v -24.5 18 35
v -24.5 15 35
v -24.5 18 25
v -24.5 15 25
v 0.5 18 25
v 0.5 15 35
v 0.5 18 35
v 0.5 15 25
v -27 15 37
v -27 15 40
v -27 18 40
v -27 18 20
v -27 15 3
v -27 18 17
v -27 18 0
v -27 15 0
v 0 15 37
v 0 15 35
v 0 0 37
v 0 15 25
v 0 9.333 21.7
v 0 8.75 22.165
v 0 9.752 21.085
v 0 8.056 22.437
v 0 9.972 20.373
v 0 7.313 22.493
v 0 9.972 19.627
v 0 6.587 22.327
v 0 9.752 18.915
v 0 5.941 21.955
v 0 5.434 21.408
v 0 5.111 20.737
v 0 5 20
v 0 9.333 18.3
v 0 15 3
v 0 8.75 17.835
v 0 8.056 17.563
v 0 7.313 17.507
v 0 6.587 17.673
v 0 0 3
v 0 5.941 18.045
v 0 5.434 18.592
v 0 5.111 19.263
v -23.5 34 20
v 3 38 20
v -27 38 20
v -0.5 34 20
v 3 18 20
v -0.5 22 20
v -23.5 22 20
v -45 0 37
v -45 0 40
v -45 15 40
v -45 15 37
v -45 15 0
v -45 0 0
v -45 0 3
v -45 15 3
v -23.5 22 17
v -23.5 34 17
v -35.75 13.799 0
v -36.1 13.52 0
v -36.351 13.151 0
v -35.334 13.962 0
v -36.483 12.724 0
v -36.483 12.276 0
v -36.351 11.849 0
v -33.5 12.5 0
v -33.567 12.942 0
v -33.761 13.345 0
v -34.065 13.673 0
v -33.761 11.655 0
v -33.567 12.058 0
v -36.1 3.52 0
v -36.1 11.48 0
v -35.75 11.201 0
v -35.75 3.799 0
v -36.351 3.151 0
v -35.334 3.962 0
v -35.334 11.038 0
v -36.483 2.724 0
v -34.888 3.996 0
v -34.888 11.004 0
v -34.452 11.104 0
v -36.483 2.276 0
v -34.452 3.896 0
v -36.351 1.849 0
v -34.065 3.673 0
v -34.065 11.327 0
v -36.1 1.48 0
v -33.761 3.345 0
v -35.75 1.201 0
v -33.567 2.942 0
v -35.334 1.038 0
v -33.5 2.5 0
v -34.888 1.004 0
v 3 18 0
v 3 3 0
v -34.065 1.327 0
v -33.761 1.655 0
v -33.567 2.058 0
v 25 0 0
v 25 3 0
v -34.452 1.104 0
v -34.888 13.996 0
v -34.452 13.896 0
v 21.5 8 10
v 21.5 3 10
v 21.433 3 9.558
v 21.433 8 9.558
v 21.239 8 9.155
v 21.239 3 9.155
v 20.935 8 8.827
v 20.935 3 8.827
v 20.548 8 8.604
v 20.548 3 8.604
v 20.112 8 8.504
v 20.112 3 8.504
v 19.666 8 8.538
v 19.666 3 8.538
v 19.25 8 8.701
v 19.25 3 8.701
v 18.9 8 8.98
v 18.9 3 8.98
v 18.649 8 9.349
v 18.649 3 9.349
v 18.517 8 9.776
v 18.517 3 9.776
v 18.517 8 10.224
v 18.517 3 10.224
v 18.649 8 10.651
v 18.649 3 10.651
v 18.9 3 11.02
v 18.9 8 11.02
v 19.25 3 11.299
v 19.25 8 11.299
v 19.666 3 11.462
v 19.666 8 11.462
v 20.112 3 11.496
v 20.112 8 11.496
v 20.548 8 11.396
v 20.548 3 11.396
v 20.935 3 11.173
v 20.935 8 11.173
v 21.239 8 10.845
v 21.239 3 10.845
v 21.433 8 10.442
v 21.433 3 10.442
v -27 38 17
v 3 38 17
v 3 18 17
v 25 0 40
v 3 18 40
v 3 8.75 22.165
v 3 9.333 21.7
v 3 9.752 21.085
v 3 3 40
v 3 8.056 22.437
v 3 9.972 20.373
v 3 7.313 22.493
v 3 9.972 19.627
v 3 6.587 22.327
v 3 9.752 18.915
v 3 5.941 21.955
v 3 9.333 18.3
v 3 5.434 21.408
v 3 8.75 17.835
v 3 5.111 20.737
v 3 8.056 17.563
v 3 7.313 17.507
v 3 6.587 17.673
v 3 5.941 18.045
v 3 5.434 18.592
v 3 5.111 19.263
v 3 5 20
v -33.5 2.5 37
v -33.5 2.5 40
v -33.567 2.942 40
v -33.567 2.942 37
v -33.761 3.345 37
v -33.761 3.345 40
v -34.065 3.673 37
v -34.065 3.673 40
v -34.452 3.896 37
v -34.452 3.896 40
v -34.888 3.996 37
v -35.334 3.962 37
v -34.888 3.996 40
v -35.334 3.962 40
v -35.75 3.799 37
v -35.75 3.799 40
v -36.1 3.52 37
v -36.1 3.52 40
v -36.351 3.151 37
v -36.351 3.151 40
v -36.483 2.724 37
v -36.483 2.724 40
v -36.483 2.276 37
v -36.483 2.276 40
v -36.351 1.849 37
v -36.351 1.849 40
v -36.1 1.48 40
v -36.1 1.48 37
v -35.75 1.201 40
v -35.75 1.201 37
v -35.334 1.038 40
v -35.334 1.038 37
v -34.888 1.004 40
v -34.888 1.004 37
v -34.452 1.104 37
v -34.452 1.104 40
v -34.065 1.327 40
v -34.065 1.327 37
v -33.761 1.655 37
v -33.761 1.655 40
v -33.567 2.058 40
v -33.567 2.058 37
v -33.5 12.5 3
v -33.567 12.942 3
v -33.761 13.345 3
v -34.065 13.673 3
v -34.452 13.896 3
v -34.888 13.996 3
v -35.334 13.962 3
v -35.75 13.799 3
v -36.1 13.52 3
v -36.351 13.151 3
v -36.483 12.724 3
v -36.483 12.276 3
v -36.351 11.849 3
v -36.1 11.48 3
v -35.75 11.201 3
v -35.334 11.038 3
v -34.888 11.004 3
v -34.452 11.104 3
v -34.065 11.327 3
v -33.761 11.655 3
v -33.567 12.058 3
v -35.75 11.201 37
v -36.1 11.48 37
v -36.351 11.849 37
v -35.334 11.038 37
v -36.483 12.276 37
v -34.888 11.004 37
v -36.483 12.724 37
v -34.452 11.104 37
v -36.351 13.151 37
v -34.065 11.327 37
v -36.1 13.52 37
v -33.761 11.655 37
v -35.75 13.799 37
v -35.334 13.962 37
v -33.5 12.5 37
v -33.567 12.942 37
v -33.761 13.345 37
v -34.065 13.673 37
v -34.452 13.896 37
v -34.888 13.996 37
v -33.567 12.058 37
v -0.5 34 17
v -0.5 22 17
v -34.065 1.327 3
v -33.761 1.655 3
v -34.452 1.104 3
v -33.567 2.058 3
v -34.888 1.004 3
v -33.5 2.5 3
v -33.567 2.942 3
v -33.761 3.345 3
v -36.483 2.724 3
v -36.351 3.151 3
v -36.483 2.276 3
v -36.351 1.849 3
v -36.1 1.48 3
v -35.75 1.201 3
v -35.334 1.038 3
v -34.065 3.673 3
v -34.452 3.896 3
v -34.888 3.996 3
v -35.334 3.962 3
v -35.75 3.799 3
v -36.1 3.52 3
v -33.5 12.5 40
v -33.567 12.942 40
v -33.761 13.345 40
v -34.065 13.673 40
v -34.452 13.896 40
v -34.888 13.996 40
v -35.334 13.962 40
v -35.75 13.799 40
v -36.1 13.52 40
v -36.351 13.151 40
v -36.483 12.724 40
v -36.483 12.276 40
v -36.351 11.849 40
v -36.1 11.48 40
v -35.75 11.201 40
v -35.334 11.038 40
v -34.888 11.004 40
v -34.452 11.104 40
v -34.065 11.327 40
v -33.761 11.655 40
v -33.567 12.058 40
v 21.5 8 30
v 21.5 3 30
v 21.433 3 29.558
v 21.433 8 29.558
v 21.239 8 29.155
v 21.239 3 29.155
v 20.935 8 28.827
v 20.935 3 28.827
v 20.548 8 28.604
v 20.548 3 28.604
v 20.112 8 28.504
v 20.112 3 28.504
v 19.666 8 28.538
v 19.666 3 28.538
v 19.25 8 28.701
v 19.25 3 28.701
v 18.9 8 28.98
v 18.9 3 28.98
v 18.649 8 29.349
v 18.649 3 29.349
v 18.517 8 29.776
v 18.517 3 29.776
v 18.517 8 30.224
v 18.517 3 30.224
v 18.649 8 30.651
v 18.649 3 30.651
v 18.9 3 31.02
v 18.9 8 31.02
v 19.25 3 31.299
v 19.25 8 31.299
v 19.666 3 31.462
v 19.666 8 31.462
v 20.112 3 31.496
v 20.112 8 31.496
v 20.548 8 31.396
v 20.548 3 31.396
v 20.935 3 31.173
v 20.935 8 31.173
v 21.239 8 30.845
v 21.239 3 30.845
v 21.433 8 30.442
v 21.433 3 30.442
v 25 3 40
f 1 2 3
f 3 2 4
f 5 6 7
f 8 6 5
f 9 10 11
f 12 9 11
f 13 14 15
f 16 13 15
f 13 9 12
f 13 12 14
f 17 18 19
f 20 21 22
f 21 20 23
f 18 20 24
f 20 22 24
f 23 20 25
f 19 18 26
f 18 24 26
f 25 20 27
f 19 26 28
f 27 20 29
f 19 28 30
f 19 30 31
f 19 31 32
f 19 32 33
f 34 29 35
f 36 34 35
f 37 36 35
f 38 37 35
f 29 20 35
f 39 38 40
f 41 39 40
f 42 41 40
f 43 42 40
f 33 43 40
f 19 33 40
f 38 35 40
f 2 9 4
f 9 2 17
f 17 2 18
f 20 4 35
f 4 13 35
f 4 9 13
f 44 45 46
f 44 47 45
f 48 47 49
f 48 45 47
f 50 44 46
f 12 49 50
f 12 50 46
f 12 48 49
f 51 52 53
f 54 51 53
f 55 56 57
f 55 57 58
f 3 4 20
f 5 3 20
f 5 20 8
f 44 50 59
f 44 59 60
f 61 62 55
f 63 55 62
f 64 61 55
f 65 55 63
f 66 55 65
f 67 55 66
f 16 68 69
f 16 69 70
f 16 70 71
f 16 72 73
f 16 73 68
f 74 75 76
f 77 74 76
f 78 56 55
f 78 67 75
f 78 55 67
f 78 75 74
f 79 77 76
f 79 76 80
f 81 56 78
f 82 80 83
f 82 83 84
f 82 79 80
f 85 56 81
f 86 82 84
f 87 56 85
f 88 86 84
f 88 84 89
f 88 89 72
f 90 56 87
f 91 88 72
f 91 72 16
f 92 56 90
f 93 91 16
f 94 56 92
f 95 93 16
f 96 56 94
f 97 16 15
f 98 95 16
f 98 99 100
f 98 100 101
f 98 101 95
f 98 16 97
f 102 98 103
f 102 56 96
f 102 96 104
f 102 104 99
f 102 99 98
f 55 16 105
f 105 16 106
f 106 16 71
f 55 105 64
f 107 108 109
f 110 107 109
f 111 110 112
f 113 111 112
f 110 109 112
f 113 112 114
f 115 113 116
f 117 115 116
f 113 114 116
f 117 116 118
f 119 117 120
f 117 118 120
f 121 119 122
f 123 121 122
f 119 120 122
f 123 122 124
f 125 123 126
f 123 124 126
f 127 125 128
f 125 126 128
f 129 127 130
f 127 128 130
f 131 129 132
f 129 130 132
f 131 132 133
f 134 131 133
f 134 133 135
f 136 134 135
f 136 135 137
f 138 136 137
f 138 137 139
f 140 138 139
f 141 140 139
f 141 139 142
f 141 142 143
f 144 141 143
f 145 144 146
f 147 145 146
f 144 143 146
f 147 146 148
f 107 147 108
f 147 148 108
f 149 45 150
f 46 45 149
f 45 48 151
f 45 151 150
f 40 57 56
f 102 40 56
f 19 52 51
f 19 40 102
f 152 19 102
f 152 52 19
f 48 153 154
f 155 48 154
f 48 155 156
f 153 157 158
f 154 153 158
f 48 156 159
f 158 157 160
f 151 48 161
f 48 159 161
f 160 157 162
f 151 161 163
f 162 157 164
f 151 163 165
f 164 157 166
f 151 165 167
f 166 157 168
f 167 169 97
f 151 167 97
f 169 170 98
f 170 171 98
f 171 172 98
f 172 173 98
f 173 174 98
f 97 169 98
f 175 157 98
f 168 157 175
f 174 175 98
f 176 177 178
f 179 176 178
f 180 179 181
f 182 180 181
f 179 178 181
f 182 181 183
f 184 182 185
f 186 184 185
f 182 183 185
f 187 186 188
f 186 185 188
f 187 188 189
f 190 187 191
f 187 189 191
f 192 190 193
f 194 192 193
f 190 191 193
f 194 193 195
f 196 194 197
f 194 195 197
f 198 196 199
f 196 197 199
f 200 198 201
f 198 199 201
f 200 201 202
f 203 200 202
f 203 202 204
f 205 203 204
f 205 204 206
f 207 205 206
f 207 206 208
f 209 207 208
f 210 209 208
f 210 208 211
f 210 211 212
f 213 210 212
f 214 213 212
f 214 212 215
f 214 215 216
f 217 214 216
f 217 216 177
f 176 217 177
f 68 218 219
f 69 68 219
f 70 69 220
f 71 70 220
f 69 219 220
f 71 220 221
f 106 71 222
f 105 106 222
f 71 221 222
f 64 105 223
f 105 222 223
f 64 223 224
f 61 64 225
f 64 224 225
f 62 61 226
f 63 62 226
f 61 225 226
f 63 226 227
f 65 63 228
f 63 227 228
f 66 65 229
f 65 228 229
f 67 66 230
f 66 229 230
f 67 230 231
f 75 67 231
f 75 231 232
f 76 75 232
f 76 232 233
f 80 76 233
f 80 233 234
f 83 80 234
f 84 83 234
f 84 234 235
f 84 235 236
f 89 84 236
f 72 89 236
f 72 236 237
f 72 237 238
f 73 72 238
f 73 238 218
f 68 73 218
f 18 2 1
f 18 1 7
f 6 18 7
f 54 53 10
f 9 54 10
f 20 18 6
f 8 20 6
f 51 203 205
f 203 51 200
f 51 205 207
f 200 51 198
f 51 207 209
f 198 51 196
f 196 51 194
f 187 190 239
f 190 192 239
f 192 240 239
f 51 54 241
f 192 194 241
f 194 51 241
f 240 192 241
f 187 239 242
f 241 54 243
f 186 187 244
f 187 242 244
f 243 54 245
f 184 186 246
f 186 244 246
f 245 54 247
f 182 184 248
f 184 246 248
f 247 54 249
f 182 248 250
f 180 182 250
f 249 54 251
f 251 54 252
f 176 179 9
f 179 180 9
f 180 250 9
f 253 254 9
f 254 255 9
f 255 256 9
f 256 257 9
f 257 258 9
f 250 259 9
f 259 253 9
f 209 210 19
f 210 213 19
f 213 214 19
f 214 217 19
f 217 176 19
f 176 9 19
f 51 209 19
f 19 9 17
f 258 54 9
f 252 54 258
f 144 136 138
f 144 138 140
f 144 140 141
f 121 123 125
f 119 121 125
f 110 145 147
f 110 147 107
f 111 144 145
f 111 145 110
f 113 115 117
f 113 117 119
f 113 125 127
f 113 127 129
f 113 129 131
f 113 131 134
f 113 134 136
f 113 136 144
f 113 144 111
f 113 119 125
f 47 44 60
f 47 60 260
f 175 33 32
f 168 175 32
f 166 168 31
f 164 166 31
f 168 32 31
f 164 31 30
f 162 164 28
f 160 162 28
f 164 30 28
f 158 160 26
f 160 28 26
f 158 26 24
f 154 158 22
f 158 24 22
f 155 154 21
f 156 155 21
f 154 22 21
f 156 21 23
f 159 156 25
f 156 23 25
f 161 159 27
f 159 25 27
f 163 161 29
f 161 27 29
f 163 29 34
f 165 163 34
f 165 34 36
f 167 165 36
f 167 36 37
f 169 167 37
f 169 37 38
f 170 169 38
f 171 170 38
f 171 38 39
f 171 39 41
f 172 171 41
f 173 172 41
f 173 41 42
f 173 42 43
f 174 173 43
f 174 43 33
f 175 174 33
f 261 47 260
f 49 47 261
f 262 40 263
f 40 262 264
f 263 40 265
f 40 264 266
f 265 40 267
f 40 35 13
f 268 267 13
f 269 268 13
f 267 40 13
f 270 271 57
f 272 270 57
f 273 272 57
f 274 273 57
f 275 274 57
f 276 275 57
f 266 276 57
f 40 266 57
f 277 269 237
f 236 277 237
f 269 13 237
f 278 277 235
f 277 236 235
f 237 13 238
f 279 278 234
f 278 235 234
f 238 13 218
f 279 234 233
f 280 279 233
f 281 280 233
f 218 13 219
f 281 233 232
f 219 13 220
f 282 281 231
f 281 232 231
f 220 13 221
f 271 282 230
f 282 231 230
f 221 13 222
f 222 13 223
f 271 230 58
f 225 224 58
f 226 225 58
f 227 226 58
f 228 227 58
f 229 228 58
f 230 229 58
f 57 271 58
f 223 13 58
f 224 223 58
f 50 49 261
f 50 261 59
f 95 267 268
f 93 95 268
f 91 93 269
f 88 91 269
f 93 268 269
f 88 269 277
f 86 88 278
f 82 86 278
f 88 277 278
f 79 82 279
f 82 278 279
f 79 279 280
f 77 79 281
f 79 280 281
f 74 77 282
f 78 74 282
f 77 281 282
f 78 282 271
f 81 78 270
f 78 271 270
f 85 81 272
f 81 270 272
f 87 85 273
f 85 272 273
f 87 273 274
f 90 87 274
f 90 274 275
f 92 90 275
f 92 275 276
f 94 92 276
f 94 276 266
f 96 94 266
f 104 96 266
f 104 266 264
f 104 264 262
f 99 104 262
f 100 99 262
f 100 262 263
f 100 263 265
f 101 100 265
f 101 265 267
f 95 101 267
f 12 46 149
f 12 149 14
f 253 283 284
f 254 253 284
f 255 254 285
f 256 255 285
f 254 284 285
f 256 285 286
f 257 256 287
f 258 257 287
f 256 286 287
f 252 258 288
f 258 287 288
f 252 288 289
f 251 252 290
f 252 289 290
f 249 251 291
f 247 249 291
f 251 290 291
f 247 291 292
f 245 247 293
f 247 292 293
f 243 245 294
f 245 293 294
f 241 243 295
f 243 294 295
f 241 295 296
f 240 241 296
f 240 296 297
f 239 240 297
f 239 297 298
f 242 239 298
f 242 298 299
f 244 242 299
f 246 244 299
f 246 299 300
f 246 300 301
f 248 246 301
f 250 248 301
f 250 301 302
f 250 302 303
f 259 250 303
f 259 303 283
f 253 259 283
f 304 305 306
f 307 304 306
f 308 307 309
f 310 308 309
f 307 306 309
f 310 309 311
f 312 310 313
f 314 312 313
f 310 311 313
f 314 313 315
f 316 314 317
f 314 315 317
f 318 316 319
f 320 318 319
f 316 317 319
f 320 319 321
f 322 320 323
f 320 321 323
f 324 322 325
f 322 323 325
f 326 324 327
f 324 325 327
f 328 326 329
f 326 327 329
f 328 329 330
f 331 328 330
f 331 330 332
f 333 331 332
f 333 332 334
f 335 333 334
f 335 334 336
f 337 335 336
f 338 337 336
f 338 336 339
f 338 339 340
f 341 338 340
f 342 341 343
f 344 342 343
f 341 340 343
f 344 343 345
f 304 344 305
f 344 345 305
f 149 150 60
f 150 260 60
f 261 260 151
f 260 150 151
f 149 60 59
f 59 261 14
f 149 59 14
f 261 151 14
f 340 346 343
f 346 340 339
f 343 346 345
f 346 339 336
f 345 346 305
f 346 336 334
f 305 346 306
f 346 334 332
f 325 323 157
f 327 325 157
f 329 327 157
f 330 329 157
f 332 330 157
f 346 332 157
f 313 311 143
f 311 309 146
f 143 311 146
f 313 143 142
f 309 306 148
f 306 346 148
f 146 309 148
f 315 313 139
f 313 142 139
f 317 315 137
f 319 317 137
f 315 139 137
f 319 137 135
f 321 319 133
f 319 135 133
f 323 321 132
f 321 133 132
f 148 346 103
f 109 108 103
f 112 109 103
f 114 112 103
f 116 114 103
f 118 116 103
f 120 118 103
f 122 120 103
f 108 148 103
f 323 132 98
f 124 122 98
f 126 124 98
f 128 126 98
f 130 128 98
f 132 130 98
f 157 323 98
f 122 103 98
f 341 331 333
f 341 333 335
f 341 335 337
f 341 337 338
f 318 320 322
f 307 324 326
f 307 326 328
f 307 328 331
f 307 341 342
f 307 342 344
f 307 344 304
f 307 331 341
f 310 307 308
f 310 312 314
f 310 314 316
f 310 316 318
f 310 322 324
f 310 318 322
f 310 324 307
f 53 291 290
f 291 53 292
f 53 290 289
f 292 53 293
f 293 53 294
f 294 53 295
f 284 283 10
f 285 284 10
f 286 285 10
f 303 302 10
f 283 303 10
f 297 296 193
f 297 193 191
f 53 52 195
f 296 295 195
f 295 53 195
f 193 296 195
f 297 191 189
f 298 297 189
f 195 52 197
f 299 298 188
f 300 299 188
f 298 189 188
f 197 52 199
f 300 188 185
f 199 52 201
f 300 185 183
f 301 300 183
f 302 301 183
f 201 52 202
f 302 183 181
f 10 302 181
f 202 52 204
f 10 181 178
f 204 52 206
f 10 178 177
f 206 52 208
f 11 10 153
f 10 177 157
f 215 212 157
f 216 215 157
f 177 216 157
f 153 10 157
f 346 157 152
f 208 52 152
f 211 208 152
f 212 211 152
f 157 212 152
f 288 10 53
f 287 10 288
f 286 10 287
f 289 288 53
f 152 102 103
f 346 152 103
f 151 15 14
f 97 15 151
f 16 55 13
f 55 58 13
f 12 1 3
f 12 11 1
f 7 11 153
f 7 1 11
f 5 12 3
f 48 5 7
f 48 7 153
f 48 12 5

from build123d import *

# Parameters (mm, degrees)
BOSS_EXTRUDE1_DEPTH     = 40
SKETCH2_R               = 1.5
BOSS_EXTRUDE2_DEPTH     = 5
SKETCH3_R               = 2.5
CUT_EXTRUDE1_DEPTH      = 50.497474683
CUT_EXTRUDE1_DEPTH_BACK = 50.497474683
SKETCH4_W               = 45
SKETCH4_H               = 15
BOSS_EXTRUDE3_DEPTH     = 3
SKETCH5_W               = 45
SKETCH5_H               = 15
BOSS_EXTRUDE4_DEPTH     = 3
SKETCH6_R               = 1.5
CUT_EXTRUDE2_DEPTH      = 63.04836823
CUT_EXTRUDE2_DEPTH_BACK = 63.04836823
SKETCH8_W               = 30
SKETCH8_H               = 40
SKETCH8_W_2             = 25
SKETCH8_H_2             = 10
BOSS_EXTRUDE7_DEPTH     = 3
BOSS_EXTRUDE8_DEPTH     = 3


with BuildPart() as part:
    # Sketch1 → Boss-Extrude1 (new body)
    with BuildSketch(Plane.XY):
        Polygon((0, 0), (25, 0), (25, 3), (3, 3), (3, 15), (0, 15), align=None)
    extrude(amount=BOSS_EXTRUDE1_DEPTH)

    # Sketch2 → Boss-Extrude2 (add)
    with BuildSketch(Plane(origin=(0, 3, 0), x_dir=(1, 0, 0), z_dir=(0, 1, 0))):
        with Locations((20, -10)):
            Circle(SKETCH2_R)
        with Locations((20, -30)):
            Circle(SKETCH2_R)
    extrude(amount=BOSS_EXTRUDE2_DEPTH)

    # Sketch3 → Cut-Extrude1 (cut, two sides)
    with BuildSketch(Plane.ZY) as cut_extrude1_sk:
        with Locations(Location((20, 7.5, 0), (0, 0, 270))):
            Circle(SKETCH3_R)
    extrude(amount=CUT_EXTRUDE1_DEPTH, mode=Mode.SUBTRACT)
    extrude(cut_extrude1_sk.sketch, amount=-CUT_EXTRUDE1_DEPTH_BACK, mode=Mode.SUBTRACT)

    # Sketch4 → Boss-Extrude3 (add)
    with BuildSketch(Plane(origin=(0, 0, 0), x_dir=(-1, 0, 0), z_dir=(0, 0, -1))):
        with Locations((22.5, 7.5)):
            Rectangle(SKETCH4_W, SKETCH4_H)
    extrude(amount=-BOSS_EXTRUDE3_DEPTH)

    # Sketch5 → Boss-Extrude4 (add)
    with BuildSketch(Plane.XY.offset(40)):
        with Locations((-22.5, 7.5)):
            Rectangle(SKETCH5_W, SKETCH5_H)
    extrude(amount=-BOSS_EXTRUDE4_DEPTH)

    # Sketch6 → Cut-Extrude2 (cut, two sides)
    with BuildSketch(Plane.XY.offset(40)) as cut_extrude2_sk:
        with Locations((-35, 12.5)):
            Circle(SKETCH6_R)
        with Locations((-35, 2.5)):
            Circle(SKETCH6_R)
    extrude(amount=CUT_EXTRUDE2_DEPTH, mode=Mode.SUBTRACT)
    extrude(cut_extrude2_sk.sketch, amount=-CUT_EXTRUDE2_DEPTH_BACK, mode=Mode.SUBTRACT)

    # Sketch8 → Boss-Extrude7 (add)
    with BuildSketch(Plane(origin=(0, 15, 0), x_dir=(1, 0, 0), z_dir=(0, 1, 0))):
        with Locations((-12, -20)):
            Rectangle(SKETCH8_W, SKETCH8_H)
        with Locations((-12, -30)):
            Rectangle(SKETCH8_W_2, SKETCH8_H_2, mode=Mode.SUBTRACT)
    extrude(amount=BOSS_EXTRUDE7_DEPTH)

    # 3DSketch1 → Boss-Extrude8 (add)
    with BuildSketch(Plane(origin=(-27, 18, 20), x_dir=(0.8320502943378437, 0.5547001962252291, 0), z_dir=(0, 0, -1))):
        Polygon((0, 0), (24.96150883, 16.641005887), (36.055512755, 0), (11.094003925, -16.641005887), align=None)
        Polygon((11.78737917, -11.371354023), (30.92453594, 1.386750491), (24.268133585, 11.371354023), (5.130976815, -1.386750491), align=None, mode=Mode.SUBTRACT)
    extrude(amount=BOSS_EXTRUDE8_DEPTH)


solid = part.part
